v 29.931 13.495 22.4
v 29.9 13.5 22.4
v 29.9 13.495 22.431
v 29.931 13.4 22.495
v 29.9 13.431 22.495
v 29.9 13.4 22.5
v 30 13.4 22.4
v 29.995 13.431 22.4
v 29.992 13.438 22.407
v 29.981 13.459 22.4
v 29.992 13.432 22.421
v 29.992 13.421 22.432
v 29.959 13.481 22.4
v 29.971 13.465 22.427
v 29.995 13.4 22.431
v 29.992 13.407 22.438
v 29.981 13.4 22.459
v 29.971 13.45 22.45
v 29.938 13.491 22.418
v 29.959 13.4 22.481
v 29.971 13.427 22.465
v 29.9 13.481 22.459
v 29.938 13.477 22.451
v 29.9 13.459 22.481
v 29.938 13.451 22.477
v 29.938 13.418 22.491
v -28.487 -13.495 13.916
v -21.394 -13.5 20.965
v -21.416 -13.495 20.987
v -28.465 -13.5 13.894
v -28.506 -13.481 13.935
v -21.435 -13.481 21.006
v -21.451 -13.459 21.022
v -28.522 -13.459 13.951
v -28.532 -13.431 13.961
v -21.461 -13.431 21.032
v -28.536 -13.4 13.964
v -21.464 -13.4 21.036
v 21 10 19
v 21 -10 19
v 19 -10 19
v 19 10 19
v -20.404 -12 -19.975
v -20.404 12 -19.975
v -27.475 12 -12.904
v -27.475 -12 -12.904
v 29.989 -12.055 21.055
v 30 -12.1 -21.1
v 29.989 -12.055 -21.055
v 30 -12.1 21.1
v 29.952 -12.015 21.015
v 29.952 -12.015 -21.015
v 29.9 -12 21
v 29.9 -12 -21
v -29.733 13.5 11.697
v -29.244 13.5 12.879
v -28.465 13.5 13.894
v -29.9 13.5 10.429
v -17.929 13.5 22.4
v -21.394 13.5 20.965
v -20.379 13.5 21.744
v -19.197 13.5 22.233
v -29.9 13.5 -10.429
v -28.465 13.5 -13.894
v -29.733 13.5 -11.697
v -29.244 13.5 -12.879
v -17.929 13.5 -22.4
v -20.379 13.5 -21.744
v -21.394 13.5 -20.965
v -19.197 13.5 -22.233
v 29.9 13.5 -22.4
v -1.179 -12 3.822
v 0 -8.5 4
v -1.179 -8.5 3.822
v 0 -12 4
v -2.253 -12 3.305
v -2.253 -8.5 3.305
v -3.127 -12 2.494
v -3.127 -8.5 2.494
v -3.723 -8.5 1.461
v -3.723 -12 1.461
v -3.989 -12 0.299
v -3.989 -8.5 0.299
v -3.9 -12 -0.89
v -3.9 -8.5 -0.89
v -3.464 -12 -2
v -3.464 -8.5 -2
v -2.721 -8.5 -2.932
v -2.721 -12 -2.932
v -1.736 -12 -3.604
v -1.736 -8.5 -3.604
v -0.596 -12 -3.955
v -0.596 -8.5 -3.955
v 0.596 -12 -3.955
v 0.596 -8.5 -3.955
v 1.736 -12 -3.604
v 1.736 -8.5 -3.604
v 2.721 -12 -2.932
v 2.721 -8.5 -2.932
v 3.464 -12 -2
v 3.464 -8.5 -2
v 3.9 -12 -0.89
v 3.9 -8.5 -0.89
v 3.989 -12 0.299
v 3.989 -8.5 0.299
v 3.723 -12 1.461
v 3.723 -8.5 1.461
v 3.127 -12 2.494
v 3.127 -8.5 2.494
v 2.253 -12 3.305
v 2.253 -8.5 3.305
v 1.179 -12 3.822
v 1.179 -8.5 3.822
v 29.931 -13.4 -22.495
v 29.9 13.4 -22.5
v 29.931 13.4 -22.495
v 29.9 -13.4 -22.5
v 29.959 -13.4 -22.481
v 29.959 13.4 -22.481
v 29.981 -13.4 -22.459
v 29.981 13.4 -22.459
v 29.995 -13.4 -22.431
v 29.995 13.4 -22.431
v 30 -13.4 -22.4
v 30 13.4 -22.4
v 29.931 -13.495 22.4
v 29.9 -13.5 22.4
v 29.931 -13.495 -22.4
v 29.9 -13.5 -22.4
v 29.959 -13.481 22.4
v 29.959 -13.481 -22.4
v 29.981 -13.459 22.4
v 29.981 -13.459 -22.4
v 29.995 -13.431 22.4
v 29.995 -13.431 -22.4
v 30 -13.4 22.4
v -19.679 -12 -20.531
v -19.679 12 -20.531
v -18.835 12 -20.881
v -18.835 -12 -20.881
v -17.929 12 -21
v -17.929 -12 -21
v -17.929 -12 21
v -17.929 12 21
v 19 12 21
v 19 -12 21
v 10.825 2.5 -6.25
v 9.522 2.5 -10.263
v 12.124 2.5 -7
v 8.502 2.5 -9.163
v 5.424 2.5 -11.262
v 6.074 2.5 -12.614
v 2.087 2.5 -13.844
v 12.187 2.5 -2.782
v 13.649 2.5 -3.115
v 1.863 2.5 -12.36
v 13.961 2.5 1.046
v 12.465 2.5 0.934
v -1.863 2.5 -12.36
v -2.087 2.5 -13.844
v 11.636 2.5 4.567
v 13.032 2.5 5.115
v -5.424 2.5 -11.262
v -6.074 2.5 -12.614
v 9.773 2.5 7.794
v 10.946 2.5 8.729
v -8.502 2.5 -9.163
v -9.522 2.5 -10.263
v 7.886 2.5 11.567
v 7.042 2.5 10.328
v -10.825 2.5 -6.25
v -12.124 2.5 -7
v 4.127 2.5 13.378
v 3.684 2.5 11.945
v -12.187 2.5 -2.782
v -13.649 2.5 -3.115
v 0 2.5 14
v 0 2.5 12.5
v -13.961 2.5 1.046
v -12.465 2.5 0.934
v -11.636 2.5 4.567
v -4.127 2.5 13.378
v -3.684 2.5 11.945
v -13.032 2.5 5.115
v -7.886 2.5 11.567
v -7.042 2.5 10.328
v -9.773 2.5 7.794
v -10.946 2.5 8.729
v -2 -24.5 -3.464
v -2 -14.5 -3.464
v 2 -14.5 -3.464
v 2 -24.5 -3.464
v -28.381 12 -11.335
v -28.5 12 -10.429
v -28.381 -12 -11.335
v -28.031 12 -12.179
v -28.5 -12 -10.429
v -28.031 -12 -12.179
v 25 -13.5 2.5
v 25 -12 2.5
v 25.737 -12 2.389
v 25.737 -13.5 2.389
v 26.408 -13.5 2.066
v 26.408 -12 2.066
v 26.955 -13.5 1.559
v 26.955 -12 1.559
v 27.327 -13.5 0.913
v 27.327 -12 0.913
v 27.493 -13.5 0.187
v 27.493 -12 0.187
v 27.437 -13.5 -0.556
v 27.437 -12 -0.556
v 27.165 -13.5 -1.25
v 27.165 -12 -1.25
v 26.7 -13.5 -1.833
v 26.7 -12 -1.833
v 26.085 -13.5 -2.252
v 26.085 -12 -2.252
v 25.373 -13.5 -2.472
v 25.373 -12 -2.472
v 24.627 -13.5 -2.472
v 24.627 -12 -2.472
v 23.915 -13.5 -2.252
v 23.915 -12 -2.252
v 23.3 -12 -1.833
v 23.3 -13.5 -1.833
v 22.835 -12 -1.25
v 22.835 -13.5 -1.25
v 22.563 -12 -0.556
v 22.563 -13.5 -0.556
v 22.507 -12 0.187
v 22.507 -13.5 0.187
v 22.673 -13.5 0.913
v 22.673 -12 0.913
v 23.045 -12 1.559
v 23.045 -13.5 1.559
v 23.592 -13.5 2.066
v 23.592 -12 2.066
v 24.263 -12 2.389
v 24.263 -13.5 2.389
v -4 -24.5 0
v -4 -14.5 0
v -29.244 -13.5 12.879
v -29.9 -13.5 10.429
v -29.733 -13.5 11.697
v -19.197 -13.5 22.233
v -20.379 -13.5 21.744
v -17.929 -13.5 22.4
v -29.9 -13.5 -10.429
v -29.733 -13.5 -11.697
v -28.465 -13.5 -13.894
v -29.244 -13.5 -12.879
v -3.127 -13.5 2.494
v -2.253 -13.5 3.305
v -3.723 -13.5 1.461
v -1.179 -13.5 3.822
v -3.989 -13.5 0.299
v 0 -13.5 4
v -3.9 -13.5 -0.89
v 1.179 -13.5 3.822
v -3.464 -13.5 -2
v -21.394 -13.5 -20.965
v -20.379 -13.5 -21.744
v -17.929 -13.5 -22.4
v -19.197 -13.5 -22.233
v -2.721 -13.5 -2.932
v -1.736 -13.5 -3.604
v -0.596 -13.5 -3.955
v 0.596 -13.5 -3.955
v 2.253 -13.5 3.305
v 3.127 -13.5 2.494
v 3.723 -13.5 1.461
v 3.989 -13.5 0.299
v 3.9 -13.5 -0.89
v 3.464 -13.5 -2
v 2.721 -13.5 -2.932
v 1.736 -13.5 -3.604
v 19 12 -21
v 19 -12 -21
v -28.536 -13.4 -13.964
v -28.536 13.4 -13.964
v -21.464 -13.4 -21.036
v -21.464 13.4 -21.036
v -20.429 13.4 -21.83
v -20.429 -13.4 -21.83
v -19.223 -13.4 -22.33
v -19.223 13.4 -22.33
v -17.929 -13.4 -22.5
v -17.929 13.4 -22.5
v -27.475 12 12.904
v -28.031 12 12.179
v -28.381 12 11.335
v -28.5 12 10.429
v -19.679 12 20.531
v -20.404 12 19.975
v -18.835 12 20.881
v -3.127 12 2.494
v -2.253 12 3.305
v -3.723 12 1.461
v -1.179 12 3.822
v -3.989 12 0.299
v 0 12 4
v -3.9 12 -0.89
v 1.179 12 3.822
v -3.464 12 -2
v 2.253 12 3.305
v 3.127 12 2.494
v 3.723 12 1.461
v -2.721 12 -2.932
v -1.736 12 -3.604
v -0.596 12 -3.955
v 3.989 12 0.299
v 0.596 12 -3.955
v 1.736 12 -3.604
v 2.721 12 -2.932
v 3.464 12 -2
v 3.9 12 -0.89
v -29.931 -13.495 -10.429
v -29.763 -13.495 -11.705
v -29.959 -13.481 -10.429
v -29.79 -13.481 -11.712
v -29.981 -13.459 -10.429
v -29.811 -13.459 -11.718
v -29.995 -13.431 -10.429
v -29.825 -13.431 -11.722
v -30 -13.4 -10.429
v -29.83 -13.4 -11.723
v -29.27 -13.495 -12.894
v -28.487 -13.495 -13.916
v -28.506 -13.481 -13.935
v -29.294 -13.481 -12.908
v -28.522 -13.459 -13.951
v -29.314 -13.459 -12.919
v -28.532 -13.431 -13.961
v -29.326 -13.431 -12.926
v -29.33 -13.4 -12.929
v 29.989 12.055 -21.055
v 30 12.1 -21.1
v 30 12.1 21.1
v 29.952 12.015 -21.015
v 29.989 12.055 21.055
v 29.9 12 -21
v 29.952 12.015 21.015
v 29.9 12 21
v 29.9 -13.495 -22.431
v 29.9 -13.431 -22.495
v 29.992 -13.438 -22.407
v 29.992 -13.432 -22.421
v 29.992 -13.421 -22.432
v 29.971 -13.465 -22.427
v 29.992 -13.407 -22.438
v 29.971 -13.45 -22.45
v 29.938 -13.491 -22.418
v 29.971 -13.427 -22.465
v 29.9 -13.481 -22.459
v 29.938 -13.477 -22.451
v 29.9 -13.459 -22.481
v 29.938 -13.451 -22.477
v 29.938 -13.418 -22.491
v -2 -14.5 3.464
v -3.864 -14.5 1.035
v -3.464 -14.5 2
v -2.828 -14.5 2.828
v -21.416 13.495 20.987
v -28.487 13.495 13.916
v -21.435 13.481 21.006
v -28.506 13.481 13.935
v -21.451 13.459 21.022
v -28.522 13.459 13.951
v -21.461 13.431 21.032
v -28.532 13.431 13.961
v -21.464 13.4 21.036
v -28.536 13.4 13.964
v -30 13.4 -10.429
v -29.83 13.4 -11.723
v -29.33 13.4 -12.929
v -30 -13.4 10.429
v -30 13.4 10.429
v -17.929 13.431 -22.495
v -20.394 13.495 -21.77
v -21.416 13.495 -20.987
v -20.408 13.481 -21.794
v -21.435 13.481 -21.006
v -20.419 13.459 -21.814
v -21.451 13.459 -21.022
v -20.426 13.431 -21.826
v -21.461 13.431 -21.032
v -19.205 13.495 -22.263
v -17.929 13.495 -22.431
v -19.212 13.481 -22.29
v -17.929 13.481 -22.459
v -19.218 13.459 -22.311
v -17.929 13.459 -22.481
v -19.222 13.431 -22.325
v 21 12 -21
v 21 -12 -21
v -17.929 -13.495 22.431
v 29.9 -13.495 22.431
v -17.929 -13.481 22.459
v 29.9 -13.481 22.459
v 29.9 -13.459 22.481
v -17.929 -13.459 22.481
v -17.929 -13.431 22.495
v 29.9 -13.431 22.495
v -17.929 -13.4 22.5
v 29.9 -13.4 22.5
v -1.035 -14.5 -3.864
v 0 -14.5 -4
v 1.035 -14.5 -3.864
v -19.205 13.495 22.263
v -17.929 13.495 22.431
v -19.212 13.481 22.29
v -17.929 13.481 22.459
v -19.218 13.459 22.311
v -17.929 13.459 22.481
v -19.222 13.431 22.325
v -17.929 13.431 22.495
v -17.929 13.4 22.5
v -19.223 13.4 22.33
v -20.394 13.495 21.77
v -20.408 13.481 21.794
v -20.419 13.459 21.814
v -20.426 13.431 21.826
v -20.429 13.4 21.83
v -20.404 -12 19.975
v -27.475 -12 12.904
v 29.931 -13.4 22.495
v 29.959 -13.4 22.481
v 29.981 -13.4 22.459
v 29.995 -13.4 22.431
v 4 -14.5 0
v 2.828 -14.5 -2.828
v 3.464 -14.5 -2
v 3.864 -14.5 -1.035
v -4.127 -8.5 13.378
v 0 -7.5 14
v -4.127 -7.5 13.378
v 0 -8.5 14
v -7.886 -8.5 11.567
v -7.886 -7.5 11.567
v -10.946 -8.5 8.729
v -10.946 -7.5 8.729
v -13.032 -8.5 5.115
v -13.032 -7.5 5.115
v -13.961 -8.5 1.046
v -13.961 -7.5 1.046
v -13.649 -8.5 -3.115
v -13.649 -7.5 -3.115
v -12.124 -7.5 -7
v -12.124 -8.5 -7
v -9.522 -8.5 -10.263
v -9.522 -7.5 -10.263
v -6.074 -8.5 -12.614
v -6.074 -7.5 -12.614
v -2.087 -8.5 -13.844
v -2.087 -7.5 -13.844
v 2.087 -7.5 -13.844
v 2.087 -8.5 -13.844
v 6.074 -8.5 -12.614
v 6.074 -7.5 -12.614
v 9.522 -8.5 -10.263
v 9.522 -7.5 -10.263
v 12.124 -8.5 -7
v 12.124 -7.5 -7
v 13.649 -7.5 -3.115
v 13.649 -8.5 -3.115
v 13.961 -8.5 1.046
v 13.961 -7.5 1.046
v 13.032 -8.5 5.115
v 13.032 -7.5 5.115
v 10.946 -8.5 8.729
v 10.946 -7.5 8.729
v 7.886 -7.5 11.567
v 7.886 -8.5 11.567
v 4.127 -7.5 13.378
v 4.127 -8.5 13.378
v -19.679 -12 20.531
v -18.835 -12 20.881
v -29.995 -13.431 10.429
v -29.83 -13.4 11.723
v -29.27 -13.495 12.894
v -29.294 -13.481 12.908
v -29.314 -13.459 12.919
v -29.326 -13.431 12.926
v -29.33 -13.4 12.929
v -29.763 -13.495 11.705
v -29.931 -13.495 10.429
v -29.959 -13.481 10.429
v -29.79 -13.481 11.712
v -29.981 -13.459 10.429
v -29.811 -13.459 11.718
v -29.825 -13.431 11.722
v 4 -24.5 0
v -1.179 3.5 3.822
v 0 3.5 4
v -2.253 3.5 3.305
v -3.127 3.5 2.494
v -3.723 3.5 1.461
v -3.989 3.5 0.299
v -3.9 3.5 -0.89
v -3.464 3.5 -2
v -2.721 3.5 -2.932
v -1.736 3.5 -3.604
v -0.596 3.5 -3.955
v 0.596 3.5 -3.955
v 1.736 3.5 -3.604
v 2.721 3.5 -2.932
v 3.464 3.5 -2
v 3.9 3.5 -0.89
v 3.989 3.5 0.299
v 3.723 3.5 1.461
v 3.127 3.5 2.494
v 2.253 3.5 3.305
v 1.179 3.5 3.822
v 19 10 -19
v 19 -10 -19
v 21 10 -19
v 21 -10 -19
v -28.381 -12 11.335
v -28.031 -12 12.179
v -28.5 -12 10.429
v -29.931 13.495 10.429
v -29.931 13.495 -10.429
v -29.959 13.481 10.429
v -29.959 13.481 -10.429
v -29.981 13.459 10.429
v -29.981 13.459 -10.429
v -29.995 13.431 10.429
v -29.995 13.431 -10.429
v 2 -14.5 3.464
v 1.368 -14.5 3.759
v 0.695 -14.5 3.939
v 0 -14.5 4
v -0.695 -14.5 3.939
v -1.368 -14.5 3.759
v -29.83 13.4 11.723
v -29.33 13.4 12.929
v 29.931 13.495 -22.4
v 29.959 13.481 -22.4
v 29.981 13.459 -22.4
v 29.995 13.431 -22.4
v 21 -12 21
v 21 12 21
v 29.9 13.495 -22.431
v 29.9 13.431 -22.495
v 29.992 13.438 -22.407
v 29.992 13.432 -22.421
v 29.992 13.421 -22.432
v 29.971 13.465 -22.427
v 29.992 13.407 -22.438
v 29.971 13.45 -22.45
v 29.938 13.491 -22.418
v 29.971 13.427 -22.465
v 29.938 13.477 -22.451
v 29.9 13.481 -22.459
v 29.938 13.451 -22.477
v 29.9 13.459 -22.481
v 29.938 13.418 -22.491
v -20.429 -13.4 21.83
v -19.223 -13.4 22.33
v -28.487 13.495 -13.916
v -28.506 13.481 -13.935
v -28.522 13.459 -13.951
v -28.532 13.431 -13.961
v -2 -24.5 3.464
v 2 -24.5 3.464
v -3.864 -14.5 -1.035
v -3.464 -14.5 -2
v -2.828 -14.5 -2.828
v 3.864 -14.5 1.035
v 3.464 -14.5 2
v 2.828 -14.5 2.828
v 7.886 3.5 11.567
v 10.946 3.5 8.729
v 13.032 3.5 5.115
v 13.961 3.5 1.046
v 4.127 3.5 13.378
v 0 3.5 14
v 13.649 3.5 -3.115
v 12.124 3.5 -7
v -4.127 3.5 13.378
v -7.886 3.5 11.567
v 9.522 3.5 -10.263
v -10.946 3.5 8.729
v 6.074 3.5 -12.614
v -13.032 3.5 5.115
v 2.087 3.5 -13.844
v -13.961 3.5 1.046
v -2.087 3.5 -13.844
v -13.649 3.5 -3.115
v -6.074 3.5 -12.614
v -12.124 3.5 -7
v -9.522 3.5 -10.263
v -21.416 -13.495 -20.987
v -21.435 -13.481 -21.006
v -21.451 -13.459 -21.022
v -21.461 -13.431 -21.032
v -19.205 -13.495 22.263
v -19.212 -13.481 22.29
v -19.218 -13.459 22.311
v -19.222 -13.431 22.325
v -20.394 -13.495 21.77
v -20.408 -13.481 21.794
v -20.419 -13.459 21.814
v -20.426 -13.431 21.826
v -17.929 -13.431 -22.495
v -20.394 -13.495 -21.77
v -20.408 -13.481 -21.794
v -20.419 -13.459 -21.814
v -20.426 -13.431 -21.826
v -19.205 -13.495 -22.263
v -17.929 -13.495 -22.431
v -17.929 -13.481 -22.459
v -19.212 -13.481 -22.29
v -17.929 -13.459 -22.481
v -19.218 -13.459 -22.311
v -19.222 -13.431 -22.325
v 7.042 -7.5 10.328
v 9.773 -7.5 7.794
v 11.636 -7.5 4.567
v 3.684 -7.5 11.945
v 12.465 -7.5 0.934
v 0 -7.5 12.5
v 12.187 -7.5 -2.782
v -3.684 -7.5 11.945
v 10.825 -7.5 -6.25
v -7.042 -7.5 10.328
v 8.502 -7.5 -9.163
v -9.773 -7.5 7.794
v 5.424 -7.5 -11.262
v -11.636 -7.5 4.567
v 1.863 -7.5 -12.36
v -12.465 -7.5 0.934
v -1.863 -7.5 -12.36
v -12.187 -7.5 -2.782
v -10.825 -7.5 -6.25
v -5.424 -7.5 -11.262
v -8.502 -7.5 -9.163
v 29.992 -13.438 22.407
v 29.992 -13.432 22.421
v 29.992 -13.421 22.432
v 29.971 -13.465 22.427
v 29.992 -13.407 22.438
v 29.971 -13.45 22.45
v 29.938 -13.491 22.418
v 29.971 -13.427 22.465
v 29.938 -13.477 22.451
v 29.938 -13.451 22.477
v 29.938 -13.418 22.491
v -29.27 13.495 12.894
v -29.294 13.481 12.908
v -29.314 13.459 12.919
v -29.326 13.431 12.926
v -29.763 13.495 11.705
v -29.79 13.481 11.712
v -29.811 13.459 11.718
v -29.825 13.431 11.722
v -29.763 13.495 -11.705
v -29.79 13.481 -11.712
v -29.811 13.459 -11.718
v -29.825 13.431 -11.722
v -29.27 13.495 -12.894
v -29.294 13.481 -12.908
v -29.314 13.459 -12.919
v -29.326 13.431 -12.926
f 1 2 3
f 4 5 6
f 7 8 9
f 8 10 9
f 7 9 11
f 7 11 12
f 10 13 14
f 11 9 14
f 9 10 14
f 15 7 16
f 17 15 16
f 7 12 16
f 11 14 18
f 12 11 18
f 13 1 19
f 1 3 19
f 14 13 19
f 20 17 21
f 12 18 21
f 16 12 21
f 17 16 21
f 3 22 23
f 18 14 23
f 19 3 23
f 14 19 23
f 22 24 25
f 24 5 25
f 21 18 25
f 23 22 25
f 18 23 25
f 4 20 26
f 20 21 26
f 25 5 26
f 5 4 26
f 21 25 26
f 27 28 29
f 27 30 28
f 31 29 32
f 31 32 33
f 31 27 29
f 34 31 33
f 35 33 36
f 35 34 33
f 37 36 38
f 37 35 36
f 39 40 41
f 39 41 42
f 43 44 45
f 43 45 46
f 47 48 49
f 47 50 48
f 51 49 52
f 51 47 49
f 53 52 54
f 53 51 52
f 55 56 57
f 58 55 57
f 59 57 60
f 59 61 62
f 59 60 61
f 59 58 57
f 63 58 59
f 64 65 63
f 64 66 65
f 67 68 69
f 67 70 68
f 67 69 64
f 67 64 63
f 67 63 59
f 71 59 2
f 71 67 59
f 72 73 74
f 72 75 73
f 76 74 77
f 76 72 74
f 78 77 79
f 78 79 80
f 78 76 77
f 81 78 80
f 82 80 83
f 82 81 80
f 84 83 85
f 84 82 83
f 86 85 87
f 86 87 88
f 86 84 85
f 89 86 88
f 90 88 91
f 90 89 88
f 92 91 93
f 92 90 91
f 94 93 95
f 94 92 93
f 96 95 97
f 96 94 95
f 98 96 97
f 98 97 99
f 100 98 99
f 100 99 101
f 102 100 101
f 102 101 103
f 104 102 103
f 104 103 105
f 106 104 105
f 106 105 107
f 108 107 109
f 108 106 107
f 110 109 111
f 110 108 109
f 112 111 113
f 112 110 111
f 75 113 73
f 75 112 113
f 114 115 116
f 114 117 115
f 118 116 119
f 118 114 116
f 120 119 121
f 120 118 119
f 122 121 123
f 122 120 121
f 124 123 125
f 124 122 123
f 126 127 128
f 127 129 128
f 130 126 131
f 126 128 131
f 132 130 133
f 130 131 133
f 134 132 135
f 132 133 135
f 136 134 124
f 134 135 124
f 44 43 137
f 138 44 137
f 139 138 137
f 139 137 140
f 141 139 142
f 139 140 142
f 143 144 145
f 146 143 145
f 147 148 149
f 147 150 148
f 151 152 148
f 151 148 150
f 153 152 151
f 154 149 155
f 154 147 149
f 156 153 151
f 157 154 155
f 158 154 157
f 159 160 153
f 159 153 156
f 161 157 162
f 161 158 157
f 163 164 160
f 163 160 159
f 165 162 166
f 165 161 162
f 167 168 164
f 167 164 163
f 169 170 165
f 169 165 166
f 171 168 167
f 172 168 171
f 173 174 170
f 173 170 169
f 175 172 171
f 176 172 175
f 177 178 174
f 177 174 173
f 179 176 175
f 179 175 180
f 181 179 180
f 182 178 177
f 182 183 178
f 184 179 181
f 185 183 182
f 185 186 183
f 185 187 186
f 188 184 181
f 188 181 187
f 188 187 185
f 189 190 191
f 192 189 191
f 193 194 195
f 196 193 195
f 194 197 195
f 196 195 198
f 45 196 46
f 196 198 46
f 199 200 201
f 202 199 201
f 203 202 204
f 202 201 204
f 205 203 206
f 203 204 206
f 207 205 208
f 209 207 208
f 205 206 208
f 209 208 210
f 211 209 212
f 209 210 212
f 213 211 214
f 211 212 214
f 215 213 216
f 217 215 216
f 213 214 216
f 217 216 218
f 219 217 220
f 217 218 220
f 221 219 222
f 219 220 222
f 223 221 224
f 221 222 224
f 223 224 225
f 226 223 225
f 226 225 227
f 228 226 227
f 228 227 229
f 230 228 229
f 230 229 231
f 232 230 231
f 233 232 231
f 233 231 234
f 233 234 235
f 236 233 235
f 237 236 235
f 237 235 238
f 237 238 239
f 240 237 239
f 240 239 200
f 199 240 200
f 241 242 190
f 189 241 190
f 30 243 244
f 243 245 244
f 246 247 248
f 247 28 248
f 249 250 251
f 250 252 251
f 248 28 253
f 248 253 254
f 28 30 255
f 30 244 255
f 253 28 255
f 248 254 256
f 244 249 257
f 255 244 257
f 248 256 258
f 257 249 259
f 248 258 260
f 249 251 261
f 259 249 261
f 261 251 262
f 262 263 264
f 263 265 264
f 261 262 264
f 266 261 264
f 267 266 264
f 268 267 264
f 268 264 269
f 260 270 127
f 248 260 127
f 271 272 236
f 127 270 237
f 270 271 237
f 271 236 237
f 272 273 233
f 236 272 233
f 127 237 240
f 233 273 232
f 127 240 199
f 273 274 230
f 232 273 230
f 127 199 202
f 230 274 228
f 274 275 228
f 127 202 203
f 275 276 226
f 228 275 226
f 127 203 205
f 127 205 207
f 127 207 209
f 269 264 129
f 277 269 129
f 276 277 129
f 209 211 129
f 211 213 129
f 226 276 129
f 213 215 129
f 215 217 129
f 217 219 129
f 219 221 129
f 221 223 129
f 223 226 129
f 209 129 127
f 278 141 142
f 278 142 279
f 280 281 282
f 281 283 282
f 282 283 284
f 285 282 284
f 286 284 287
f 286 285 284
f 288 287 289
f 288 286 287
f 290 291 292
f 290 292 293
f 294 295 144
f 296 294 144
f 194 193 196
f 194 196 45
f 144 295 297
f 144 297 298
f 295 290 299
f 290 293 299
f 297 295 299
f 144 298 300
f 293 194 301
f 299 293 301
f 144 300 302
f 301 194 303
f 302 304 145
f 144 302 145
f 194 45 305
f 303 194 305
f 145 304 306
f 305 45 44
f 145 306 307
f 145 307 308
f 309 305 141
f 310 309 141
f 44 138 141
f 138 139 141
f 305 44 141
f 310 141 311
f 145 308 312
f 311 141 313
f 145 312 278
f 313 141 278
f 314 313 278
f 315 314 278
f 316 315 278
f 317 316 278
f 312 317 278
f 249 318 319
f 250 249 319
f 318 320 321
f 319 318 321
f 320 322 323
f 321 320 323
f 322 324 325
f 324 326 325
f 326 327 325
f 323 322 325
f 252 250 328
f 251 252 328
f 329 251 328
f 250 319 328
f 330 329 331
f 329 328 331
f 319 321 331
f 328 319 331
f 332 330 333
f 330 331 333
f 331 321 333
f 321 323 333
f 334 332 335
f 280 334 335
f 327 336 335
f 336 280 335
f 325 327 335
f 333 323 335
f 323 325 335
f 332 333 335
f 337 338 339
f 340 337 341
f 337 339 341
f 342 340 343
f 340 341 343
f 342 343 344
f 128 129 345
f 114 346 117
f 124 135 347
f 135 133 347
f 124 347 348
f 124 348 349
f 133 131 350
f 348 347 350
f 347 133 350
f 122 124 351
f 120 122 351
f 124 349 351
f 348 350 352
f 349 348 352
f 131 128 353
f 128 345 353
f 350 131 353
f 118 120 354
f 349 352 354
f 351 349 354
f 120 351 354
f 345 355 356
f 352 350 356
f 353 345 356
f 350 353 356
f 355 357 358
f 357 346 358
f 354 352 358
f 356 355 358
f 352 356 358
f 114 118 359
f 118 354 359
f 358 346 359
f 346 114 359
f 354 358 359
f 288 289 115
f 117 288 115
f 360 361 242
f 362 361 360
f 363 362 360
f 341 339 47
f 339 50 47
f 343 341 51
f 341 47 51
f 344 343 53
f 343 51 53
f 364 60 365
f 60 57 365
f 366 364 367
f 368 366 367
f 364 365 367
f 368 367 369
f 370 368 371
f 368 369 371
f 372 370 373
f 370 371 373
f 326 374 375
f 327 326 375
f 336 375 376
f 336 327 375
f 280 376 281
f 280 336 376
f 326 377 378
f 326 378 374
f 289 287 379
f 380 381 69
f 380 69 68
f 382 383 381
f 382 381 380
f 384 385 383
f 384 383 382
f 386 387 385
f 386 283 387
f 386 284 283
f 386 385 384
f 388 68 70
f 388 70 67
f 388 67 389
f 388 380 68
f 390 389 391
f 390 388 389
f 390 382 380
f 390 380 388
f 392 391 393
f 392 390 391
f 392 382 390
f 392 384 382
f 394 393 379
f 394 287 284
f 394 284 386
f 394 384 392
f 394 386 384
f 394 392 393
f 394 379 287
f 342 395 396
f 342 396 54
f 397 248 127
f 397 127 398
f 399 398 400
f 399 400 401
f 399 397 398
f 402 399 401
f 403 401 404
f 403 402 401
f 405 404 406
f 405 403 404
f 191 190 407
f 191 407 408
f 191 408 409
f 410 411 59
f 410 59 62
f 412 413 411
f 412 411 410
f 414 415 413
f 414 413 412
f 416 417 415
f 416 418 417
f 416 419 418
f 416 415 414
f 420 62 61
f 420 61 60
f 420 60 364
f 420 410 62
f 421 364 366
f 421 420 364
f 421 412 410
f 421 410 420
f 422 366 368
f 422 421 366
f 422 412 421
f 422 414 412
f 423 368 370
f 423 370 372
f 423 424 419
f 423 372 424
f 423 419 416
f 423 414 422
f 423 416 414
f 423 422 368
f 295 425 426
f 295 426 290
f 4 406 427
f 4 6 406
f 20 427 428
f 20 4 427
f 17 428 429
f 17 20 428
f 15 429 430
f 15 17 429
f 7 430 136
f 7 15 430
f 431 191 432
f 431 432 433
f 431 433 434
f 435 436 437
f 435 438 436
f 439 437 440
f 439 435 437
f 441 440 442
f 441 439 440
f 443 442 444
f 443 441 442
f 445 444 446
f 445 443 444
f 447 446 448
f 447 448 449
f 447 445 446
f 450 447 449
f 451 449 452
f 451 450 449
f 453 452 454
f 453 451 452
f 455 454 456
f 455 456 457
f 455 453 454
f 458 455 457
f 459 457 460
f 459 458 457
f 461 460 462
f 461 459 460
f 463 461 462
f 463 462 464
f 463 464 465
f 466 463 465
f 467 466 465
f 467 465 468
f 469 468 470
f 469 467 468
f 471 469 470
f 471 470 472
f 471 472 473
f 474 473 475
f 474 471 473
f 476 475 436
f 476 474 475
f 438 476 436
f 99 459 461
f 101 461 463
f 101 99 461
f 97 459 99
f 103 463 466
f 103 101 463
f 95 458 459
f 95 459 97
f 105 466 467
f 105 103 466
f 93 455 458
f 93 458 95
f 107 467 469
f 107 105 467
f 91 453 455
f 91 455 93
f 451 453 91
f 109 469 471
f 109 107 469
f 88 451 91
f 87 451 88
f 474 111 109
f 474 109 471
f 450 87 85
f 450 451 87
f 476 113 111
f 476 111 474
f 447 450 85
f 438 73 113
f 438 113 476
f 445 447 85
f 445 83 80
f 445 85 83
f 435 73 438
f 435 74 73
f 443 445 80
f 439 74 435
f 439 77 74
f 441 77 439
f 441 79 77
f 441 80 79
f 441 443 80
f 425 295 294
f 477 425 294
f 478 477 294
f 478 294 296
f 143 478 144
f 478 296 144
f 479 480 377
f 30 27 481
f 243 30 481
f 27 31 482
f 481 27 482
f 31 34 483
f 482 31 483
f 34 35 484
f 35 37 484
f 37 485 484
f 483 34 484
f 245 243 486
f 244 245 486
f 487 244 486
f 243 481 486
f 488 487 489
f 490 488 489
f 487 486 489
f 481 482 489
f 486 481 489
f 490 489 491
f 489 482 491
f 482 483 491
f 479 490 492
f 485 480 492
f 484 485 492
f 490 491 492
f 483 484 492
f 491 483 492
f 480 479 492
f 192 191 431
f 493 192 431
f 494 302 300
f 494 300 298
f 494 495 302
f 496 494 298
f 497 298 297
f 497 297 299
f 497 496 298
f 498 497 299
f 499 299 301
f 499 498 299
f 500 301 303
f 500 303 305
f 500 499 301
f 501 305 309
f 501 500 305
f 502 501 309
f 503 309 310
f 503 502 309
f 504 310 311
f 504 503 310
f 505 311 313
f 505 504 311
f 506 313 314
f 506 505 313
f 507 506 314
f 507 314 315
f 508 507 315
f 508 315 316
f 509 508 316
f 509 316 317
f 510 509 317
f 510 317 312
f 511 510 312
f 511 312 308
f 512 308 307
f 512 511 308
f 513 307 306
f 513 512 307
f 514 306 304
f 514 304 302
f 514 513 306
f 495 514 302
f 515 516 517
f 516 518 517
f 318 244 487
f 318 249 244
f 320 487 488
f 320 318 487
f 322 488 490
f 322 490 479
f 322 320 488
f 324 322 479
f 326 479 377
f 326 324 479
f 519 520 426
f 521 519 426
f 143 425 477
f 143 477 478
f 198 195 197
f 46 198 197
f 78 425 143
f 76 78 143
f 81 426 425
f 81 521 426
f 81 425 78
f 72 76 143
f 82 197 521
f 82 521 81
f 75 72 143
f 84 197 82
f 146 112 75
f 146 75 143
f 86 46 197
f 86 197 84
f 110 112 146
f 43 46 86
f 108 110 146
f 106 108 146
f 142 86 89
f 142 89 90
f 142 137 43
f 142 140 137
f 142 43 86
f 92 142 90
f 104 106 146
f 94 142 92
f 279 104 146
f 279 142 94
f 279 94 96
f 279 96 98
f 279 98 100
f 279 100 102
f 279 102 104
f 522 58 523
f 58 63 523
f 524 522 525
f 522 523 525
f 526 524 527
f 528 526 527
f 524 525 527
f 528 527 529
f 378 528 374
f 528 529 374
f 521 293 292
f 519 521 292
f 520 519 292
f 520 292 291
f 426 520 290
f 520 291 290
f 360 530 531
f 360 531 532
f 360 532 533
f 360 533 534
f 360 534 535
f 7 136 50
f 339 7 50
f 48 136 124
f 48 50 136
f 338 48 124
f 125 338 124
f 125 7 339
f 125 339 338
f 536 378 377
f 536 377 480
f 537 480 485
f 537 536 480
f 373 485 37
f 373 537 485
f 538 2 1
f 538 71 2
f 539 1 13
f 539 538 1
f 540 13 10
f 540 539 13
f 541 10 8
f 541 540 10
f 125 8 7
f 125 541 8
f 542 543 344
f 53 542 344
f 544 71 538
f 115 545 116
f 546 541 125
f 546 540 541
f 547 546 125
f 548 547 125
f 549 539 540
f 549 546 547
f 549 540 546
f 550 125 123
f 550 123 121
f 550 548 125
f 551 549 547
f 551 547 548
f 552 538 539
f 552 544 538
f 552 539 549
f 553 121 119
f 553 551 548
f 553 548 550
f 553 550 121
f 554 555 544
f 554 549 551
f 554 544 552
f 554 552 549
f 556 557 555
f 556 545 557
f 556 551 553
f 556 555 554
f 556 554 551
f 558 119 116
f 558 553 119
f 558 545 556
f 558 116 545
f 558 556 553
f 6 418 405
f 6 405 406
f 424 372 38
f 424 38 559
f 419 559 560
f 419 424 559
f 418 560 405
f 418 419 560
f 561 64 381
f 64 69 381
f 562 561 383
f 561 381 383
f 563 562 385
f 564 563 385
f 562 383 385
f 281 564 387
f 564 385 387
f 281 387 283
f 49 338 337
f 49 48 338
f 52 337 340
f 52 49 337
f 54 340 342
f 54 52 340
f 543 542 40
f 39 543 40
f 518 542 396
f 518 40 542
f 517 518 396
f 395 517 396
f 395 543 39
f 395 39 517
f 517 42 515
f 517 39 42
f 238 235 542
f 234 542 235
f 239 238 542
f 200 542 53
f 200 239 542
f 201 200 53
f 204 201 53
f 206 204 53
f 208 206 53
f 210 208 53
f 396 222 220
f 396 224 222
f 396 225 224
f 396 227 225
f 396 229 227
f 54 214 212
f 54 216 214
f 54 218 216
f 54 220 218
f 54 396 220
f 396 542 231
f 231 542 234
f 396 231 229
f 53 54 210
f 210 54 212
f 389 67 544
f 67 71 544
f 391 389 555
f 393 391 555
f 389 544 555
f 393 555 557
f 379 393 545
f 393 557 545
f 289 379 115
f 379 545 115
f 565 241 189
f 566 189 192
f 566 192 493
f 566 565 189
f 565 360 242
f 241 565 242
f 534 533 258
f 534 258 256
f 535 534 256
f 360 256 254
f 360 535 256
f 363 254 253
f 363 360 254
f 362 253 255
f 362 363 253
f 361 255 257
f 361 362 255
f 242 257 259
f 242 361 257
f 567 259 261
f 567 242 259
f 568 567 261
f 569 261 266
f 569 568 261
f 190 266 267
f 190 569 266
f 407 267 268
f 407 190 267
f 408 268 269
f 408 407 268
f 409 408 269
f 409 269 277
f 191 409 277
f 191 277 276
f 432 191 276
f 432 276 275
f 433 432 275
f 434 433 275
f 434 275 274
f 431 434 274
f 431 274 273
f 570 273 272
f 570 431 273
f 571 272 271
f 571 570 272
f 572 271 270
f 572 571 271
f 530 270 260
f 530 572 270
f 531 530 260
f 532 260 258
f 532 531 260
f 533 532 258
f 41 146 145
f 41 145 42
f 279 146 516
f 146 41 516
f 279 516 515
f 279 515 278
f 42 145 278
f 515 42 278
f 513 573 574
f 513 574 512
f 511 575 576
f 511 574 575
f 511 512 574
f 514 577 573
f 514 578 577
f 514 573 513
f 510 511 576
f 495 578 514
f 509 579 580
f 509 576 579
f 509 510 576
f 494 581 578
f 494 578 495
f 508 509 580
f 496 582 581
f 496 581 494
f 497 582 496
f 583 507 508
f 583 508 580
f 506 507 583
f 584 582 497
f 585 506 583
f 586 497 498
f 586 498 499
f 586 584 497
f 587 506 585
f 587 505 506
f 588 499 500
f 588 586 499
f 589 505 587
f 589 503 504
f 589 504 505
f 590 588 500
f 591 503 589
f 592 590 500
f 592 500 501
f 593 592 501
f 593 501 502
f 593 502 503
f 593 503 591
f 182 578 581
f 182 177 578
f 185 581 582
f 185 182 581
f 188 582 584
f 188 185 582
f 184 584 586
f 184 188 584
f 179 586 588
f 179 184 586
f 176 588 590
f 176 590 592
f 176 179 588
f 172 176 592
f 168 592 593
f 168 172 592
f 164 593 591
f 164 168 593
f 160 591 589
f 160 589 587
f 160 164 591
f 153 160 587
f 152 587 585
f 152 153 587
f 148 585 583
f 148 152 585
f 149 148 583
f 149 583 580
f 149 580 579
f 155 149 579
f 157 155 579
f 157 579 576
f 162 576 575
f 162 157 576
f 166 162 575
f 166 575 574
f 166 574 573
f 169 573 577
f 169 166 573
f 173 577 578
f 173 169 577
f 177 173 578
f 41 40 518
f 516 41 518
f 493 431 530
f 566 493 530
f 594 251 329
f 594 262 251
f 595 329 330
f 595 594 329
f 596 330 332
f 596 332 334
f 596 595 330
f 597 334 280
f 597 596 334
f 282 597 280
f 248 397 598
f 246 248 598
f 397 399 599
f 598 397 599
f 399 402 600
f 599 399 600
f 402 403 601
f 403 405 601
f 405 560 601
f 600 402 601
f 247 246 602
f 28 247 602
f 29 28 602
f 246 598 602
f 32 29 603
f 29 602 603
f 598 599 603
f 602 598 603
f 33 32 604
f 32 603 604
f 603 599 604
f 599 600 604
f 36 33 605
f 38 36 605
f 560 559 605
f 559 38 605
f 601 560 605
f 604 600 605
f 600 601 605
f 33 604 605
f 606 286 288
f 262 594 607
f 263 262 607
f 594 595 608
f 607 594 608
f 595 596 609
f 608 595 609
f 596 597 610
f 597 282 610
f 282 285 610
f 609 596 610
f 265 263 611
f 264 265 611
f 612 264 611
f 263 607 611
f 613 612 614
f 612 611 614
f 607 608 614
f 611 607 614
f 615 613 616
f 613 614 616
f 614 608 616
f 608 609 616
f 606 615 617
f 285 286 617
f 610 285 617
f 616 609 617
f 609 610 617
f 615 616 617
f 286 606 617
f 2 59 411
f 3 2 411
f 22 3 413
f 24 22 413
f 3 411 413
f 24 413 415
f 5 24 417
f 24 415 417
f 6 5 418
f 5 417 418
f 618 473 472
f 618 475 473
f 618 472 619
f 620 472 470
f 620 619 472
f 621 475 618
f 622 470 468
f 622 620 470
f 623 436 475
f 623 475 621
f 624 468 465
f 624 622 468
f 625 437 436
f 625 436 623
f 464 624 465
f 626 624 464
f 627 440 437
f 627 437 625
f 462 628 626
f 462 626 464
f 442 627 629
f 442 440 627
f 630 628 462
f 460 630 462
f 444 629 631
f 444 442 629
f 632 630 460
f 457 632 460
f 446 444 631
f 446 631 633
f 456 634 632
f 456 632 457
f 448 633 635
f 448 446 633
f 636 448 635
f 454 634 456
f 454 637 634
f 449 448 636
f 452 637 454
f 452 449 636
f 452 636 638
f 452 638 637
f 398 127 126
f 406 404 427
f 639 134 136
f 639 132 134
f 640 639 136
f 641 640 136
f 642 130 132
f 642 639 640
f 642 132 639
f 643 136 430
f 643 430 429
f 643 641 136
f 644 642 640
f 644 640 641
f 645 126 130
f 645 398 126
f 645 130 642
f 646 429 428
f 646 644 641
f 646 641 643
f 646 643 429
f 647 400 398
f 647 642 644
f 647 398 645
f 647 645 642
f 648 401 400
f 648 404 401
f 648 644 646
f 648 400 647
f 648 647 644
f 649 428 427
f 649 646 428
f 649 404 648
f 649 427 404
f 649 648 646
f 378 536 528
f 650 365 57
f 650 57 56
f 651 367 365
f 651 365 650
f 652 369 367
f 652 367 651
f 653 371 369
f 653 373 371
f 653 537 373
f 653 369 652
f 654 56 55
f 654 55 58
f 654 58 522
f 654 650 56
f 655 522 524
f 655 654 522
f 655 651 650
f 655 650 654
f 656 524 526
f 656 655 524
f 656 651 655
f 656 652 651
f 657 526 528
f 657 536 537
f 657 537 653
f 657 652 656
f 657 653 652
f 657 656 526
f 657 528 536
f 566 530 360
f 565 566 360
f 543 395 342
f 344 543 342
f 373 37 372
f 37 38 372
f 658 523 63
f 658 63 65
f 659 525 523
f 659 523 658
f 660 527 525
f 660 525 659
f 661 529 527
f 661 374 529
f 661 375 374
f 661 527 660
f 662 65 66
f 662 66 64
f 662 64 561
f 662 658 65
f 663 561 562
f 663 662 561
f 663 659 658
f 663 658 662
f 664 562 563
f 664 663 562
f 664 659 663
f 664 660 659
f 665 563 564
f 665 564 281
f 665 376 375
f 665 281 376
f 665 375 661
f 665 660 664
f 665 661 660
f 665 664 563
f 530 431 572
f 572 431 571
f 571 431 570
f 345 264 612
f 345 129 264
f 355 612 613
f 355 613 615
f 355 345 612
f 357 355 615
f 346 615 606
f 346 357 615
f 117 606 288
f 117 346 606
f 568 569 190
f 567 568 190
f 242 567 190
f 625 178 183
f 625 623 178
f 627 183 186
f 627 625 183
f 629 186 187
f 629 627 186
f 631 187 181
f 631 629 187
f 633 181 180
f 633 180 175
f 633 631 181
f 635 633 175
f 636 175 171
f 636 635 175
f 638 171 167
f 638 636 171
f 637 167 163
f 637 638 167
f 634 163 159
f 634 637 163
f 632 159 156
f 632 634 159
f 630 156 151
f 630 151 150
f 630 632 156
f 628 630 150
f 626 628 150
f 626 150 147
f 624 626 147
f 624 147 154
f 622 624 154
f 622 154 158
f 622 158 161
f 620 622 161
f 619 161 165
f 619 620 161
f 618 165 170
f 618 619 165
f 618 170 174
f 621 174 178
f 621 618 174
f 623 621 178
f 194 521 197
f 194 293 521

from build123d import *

# Parameters (mm, degrees)
SKETCH_1_W          = 60
SKETCH_1_H          = 45
EXTRUDE_1_DEPTH     = 13.5
CHAMFER_1_SIZE      = 10
FILLET_1_R          = 5
SHELL_1_T           = -1.5
FILLET_2_R          = 0.1
SKETCH_4_W          = 42
SKETCH_4_H          = 24
SKETCH_4_W_2        = 38
SKETCH_4_H_2        = 20
EXTRUDE_1_2_DEPTH   = 1
EXTRUDE_START       = 1
SKETCH_5_R          = 4
EXTRUDE_2_DEPTH     = 1
EXTRUDE_3_DEPTH     = 10
CUT_EXTRUDE_1_REACH = 47.349
SKETCH_7_R          = 2.5


with BuildPart() as part:
    # 草图1 → Extrude 1 (new, symmetric)
    with BuildSketch(Plane(origin=(0, 0, 0), x_dir=(1, 0, 0), z_dir=(0, 1, 0))):
        Rectangle(SKETCH_1_W, SKETCH_1_H)
    extrude(amount=EXTRUDE_1_DEPTH, both=True)

    # 倒角1
    chamfer_1_edges = [part.edges().sort_by_distance(p)[0] for p in [
        (-30, 0, 22.5),
        (-30, 0, -22.5),
    ]]
    chamfer(chamfer_1_edges, length=CHAMFER_1_SIZE)

    # 圆角1
    fillet_1_edges = [part.edges().sort_by_distance(p)[0] for p in [
        (-30, 0, 12.5),
        (-30, 0, -12.5),
        (-20, 0, -22.5),
        (-20, 0, 22.5),
    ]]
    fillet(fillet_1_edges, radius=FILLET_1_R)

    # 抽壳1
    shell_1_openings = [part.faces().sort_by_distance(p)[0] for p in [
        (30, 0, 0),
    ]]
    offset(amount=SHELL_1_T, openings=shell_1_openings, kind=Kind.INTERSECTION)

    # 圆角2
    fillet_2_edges = [part.edges().sort_by_distance(p)[0] for p in [
        (-25, 13.5, -17.5),
        (-30, 13.5, 0),
        (-25, 13.5, 17.5),
        (6.035533906, 13.5, 22.5),
        (-19.84234935, 13.5, 22.119397663),
        (-29.619397663, 13.5, 12.34234935),
        (-29.619397663, 13.5, -12.34234935),
        (-19.84234935, 13.5, -22.119397663),
        (-25, -13.5, -17.5),
        (-30, -13.5, 0),
        (6.035533906, -13.5, 22.5),
        (-25, -13.5, 17.5),
        (-19.84234935, -13.5, 22.119397663),
        (-29.619397663, -13.5, 12.34234935),
        (-29.619397663, -13.5, -12.34234935),
        (-19.84234935, -13.5, -22.119397663),
        (30, 13.5, 0),
        (6.035533906, -13.5, -22.5),
        (30, -12, 0),
        (30, 0, 21),
        (30, 0, -21),
        (30, 12, 0),
        (30, -13.5, 0),
        (6.035533906, 13.5, -22.5),
        (30, 0, 22.5),
        (30, 0, -22.5),
    ]]
    fillet(fillet_2_edges, radius=FILLET_2_R)

    # 草图3 → 旋转1 (revolve)
    with BuildSketch(Plane.XY, mode=Mode.PRIVATE) as revolve_1_sk:
        Polygon((0, 12), (4, 12), (4, 3.5), (14, 3.5), (14, 2.5), (12.5, 2.5), (12.5, -7.5), (14, -7.5), (14, -8.5), (4, -8.5), (4, -12), (0, -12), align=None)
    revolve(revolve_1_sk.sketch.rotate(Axis((0, 13.4, 0), (0, -1, 0)), 90), axis=Axis((0, 13.4, 0), (0, -1, 0)))

    # 草图4 → Extrude 1 2 (add, symmetric)
    with BuildSketch(Plane(origin=(20, 0, 0), x_dir=(0, 0, -1), z_dir=(1, 0, 0))):
        Rectangle(SKETCH_4_W, SKETCH_4_H)
        Rectangle(SKETCH_4_W_2, SKETCH_4_H_2, mode=Mode.SUBTRACT)
    extrude(amount=EXTRUDE_1_2_DEPTH, both=True)

    # 草图5 → 凸台-拉伸2 (add)
    with BuildSketch(Plane.XZ.offset(13.5).offset(EXTRUDE_START)):
        with Locations(Location((0, 0, 0), (0, 0, 90))):
            Circle(SKETCH_5_R)
    extrude(amount=-EXTRUDE_2_DEPTH)

    # 草图6 → 凸台-拉伸3 (add)
    with BuildSketch(Plane.XZ.offset(14.5)):
        Polygon((4, 0), (2, 3.464101615), (-2, 3.464101615), (-4, 0), (-2, -3.464101615), (2, -3.464101615), align=None)
    extrude(amount=EXTRUDE_3_DEPTH)

    # 草图7 → 切除-拉伸1 (cut, up to next)
    with BuildSketch(Plane(origin=(0, -12, 0), x_dir=(1, 0, 0), z_dir=(0, 1, 0)), mode=Mode.PRIVATE) as cut_extrude_1_sk1:
        with Locations(Location((25, 0, 0), (0, 0, 270))):
            Circle(SKETCH_7_R)
    cut_extrude_1_tool1 = extrude(cut_extrude_1_sk1.sketch, amount=-CUT_EXTRUDE_1_REACH, mode=Mode.PRIVATE) & part.part
    add(cut_extrude_1_tool1.solids().sort_by_distance((25, -12, 0))[0], mode=Mode.SUBTRACT)


solid = part.part
